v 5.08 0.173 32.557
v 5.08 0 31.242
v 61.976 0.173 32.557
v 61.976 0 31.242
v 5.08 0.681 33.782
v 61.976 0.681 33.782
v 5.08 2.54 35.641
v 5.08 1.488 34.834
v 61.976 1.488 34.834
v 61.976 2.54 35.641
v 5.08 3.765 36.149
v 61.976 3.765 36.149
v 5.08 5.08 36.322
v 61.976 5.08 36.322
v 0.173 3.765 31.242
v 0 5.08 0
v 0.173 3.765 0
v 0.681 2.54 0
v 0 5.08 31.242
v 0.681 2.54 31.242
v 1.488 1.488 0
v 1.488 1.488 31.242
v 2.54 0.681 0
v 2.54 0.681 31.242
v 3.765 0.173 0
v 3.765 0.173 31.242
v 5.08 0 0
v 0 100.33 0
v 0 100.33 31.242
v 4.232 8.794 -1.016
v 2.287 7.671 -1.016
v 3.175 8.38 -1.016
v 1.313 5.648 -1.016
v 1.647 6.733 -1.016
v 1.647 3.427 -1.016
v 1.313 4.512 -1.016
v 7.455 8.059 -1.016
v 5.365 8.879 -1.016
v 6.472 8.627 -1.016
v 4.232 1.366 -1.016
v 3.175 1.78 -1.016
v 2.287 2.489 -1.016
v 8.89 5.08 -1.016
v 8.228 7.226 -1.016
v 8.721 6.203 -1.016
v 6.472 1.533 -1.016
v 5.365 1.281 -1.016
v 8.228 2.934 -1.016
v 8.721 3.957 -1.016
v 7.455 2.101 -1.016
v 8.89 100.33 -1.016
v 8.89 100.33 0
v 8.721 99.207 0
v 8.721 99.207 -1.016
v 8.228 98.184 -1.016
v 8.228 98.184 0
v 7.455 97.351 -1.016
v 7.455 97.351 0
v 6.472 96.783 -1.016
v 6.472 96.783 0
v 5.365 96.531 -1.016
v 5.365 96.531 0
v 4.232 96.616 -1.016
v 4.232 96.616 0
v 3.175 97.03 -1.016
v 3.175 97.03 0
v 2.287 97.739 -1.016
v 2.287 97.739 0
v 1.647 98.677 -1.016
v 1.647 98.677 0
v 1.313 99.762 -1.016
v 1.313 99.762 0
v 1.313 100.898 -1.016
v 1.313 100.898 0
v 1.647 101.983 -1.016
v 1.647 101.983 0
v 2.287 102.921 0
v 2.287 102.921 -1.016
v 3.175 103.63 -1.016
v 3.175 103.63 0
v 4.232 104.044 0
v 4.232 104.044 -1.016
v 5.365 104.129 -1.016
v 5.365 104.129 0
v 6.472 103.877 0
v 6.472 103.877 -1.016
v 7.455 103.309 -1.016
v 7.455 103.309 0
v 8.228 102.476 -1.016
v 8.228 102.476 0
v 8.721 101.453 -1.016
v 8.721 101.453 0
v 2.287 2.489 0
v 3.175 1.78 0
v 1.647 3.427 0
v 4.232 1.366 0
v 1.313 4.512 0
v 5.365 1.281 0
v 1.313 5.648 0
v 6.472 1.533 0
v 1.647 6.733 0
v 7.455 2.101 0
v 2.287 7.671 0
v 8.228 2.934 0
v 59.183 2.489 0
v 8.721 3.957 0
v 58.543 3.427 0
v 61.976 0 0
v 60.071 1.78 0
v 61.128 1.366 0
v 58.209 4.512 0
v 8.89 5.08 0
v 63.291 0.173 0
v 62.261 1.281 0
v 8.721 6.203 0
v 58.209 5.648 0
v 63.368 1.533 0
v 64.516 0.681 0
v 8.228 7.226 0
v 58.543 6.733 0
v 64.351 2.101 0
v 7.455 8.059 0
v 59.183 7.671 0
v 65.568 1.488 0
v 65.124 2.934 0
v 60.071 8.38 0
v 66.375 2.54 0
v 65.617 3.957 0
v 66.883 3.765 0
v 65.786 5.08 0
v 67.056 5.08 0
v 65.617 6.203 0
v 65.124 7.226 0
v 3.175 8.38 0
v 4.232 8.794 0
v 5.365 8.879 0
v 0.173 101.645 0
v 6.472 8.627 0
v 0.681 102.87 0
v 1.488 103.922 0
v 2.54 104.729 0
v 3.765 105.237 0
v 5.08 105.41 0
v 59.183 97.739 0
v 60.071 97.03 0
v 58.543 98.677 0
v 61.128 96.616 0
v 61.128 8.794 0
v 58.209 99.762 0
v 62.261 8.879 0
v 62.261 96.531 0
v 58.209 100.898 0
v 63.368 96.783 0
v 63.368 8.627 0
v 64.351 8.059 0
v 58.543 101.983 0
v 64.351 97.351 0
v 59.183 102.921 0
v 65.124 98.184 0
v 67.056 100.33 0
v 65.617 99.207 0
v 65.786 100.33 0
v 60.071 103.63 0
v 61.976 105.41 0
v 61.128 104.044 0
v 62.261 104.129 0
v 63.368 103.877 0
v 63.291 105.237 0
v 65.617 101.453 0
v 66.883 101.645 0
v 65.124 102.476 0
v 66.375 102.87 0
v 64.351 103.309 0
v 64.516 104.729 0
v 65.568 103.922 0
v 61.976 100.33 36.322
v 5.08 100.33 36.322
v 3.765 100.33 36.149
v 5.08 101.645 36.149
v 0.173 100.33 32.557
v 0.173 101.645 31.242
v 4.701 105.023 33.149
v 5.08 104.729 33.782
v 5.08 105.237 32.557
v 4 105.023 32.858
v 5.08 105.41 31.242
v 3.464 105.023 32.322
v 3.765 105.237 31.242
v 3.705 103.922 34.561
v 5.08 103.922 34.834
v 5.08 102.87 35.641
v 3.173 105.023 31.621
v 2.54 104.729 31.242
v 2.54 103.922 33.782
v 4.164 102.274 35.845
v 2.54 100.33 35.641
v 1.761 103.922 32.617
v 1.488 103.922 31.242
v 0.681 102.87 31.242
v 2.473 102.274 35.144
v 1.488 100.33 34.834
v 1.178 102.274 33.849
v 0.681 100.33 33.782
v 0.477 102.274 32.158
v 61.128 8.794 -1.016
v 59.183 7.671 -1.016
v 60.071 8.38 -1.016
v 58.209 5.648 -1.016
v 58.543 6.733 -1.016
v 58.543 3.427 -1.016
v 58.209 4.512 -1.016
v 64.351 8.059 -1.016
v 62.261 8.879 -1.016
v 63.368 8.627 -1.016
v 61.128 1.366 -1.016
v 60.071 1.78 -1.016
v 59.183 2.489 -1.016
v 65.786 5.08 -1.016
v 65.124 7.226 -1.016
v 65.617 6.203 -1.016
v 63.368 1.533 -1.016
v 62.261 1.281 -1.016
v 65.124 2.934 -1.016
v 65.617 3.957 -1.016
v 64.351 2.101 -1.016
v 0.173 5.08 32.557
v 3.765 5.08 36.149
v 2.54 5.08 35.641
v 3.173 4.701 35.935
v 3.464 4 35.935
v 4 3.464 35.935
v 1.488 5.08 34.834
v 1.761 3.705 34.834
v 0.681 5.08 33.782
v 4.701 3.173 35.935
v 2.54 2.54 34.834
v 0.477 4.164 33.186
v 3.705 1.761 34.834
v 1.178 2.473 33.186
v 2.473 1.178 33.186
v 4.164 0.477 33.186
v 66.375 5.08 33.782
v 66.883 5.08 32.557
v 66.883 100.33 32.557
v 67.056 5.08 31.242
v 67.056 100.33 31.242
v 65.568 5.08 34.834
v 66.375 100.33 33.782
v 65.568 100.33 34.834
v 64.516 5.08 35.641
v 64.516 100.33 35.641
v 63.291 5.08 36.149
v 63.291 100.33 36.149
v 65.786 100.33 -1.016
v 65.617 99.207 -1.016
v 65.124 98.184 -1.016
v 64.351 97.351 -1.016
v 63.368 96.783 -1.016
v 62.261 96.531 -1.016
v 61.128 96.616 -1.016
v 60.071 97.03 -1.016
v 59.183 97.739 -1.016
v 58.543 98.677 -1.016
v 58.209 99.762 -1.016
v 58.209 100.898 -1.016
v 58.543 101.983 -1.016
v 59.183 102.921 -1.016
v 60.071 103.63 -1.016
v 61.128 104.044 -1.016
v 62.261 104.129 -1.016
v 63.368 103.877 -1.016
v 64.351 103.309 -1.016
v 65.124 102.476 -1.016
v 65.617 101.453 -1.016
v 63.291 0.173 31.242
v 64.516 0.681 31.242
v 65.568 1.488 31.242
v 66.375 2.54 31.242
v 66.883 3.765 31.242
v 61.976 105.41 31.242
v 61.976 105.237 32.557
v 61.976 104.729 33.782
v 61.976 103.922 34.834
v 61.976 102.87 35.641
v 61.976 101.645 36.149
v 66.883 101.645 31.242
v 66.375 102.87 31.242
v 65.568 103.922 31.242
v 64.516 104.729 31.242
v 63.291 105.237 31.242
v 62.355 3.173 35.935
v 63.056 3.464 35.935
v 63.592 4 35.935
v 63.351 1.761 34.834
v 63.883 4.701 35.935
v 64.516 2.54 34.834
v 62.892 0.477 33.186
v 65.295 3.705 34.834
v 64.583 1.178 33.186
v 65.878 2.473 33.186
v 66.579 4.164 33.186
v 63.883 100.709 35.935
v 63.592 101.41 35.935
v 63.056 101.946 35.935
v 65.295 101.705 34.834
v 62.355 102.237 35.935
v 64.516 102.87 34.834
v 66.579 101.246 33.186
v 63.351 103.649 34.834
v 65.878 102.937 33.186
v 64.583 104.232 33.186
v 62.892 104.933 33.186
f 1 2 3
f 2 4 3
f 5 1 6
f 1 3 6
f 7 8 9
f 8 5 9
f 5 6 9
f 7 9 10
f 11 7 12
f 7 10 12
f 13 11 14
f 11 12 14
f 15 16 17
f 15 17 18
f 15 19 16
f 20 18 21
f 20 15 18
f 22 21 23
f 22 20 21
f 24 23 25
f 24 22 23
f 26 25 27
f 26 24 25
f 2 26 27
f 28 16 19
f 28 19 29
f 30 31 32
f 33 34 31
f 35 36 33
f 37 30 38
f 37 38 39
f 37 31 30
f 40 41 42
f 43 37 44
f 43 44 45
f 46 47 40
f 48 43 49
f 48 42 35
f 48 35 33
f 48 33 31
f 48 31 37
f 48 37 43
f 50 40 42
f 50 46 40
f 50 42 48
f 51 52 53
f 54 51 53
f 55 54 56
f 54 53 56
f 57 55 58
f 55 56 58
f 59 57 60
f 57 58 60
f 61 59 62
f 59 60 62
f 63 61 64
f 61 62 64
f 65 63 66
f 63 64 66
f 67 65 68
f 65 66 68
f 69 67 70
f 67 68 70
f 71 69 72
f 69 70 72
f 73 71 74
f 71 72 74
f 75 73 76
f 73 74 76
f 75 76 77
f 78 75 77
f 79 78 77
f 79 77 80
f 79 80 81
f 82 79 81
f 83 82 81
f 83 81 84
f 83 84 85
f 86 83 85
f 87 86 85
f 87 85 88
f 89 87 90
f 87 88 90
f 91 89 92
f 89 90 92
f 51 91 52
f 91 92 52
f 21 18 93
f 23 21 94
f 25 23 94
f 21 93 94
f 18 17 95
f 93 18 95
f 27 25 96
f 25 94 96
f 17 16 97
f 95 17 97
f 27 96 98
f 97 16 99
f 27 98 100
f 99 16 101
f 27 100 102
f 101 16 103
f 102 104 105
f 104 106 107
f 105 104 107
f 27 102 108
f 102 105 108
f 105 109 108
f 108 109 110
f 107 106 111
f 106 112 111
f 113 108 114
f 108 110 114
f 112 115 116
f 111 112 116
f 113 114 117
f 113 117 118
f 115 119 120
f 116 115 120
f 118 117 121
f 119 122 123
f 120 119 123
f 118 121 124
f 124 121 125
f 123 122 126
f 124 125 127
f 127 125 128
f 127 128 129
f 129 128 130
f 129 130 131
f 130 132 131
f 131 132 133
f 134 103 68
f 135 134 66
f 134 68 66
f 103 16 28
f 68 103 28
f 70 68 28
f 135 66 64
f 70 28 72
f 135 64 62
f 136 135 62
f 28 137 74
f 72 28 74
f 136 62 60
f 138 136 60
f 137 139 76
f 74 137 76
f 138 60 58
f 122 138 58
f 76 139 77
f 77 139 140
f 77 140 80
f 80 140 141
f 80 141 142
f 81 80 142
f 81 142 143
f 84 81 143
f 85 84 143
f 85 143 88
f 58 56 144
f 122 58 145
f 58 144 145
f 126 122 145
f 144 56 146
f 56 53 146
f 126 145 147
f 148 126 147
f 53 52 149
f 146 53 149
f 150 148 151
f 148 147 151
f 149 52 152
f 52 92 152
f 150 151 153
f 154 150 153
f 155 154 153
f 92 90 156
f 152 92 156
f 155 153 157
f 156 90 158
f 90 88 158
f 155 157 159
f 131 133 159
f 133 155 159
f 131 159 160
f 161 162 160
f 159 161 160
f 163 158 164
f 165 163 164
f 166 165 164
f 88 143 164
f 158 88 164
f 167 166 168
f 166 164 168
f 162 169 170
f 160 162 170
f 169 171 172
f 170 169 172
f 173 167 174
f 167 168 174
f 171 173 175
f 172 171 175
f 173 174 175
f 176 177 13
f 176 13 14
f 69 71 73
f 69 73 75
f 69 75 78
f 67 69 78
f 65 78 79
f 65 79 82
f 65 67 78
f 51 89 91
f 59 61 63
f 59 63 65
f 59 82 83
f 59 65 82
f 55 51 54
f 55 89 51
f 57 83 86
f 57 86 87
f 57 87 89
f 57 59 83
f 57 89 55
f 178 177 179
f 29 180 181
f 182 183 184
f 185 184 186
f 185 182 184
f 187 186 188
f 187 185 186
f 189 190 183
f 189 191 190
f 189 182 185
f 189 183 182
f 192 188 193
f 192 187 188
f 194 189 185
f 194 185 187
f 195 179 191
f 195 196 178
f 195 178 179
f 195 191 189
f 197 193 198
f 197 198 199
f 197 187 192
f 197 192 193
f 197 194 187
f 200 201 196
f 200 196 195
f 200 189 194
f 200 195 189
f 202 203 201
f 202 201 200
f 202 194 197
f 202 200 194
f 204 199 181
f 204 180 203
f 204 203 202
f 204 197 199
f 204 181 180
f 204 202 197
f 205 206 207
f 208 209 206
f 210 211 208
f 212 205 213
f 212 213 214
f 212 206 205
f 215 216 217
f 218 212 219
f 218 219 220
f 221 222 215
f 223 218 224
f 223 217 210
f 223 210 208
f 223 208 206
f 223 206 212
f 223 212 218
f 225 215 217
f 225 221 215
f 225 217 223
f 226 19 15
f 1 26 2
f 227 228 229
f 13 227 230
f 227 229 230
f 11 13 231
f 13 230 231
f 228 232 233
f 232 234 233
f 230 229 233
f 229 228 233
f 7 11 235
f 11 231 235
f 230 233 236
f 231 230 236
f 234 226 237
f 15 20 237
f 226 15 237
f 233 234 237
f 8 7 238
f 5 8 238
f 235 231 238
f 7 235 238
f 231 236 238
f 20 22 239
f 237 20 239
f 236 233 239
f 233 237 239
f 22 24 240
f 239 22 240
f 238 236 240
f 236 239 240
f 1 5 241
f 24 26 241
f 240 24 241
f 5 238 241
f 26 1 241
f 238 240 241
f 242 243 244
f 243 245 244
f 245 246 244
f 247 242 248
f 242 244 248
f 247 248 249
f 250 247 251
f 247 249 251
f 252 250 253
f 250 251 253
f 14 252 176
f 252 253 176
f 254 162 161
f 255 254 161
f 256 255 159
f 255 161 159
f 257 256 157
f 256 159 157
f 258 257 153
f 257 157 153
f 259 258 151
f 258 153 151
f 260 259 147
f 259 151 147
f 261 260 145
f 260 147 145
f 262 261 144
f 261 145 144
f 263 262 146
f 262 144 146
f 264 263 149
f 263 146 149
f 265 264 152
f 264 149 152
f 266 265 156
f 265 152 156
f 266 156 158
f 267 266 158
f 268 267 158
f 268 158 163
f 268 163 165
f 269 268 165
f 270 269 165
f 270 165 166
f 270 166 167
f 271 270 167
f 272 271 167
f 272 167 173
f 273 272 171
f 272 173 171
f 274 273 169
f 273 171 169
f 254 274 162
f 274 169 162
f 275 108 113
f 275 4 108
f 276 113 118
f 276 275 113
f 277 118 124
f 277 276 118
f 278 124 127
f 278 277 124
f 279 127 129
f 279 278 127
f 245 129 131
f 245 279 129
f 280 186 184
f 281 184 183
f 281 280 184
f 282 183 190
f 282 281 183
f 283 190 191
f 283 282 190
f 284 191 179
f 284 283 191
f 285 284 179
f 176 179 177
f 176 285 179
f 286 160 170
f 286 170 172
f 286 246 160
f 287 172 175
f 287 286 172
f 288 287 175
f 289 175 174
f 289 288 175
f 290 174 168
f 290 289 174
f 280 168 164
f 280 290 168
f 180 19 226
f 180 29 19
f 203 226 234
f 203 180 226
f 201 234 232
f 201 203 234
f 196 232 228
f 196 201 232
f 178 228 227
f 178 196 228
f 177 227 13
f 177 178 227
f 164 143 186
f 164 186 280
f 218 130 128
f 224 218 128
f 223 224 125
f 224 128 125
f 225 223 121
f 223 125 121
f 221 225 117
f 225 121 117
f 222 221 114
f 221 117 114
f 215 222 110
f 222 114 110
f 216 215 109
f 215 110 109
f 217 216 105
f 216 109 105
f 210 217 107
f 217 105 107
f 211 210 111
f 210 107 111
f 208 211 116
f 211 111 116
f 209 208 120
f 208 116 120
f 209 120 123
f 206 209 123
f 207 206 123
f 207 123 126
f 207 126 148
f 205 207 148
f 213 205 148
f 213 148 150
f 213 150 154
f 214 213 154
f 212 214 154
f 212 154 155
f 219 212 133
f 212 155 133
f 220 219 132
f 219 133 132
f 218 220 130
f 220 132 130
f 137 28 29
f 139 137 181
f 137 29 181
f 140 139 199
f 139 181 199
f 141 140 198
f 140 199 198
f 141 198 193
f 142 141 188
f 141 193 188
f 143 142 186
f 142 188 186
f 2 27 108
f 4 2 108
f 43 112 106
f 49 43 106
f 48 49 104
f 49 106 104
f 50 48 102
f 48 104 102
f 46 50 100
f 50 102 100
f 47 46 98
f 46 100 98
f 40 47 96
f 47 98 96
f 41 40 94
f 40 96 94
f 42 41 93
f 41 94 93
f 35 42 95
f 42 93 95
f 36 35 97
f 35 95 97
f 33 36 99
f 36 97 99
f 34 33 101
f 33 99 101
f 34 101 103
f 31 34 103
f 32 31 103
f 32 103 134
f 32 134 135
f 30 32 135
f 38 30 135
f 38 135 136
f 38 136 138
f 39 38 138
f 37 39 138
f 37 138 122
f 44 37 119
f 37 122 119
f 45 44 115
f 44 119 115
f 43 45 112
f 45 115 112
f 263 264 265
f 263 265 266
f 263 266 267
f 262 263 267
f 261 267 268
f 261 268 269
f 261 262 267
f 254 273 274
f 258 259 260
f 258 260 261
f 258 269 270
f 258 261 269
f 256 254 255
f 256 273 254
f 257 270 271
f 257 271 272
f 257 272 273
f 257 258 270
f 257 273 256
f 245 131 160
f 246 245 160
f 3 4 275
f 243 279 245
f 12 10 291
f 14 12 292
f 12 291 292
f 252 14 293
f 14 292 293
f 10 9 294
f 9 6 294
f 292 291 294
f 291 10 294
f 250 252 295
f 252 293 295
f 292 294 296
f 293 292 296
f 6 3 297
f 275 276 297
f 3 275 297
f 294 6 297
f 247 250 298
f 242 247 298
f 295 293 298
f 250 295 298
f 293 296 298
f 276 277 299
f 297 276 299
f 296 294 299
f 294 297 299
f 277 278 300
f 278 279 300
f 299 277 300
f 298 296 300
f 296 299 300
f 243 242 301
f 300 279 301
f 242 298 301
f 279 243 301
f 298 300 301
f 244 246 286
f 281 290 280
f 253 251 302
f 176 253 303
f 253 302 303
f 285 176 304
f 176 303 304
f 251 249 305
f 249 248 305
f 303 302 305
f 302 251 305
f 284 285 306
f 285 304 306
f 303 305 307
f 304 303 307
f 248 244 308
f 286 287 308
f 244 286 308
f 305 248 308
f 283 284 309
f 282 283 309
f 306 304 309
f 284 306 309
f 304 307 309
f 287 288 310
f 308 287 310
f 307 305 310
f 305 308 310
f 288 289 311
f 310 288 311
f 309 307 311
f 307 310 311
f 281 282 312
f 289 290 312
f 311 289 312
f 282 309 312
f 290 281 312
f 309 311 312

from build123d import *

# Parameters (mm, degrees)
F0_W     = 67.056
F0_H     = 105.41
F1_DEPTH = 36.322
F2_R     = 5.08
F3_R     = 3.81
F4_DEPTH = 1.016


with BuildPart() as f1:
    # F0 (on Top) → F1 (new body)
    with BuildSketch(Plane.XY):
        with Locations((33.528, 52.705)):
            Rectangle(F0_W, F0_H)
    extrude(amount=F1_DEPTH)

    # F2
    f2_edges = [f1.edges().sort_by_distance(p)[0] for p in [
        (0, 0, 18.161),
        (67.056, 0, 18.161),
        (67.056, 105.41, 18.161),
        (0, 52.705, 36.322),
        (33.528, 0, 36.322),
        (67.056, 52.705, 36.322),
        (33.528, 105.41, 36.322),
        (0, 105.41, 18.161),
    ]]
    fillet(f2_edges, radius=F2_R)

    # F3 (on face) → F4 (join)
    with BuildSketch(Plane(origin=(0, 0, 0), x_dir=(1, 0, 0), z_dir=(0, 0, -1))):
        with Locations((5.08, -5.08)):
            Circle(F3_R)
        with Locations((61.976, -5.08)):
            Circle(F3_R)
        with Locations((5.08, -100.33)):
            Circle(F3_R)
        with Locations((61.976, -100.33)):
            Circle(F3_R)
    extrude(amount=F4_DEPTH)


solid = f1.part
